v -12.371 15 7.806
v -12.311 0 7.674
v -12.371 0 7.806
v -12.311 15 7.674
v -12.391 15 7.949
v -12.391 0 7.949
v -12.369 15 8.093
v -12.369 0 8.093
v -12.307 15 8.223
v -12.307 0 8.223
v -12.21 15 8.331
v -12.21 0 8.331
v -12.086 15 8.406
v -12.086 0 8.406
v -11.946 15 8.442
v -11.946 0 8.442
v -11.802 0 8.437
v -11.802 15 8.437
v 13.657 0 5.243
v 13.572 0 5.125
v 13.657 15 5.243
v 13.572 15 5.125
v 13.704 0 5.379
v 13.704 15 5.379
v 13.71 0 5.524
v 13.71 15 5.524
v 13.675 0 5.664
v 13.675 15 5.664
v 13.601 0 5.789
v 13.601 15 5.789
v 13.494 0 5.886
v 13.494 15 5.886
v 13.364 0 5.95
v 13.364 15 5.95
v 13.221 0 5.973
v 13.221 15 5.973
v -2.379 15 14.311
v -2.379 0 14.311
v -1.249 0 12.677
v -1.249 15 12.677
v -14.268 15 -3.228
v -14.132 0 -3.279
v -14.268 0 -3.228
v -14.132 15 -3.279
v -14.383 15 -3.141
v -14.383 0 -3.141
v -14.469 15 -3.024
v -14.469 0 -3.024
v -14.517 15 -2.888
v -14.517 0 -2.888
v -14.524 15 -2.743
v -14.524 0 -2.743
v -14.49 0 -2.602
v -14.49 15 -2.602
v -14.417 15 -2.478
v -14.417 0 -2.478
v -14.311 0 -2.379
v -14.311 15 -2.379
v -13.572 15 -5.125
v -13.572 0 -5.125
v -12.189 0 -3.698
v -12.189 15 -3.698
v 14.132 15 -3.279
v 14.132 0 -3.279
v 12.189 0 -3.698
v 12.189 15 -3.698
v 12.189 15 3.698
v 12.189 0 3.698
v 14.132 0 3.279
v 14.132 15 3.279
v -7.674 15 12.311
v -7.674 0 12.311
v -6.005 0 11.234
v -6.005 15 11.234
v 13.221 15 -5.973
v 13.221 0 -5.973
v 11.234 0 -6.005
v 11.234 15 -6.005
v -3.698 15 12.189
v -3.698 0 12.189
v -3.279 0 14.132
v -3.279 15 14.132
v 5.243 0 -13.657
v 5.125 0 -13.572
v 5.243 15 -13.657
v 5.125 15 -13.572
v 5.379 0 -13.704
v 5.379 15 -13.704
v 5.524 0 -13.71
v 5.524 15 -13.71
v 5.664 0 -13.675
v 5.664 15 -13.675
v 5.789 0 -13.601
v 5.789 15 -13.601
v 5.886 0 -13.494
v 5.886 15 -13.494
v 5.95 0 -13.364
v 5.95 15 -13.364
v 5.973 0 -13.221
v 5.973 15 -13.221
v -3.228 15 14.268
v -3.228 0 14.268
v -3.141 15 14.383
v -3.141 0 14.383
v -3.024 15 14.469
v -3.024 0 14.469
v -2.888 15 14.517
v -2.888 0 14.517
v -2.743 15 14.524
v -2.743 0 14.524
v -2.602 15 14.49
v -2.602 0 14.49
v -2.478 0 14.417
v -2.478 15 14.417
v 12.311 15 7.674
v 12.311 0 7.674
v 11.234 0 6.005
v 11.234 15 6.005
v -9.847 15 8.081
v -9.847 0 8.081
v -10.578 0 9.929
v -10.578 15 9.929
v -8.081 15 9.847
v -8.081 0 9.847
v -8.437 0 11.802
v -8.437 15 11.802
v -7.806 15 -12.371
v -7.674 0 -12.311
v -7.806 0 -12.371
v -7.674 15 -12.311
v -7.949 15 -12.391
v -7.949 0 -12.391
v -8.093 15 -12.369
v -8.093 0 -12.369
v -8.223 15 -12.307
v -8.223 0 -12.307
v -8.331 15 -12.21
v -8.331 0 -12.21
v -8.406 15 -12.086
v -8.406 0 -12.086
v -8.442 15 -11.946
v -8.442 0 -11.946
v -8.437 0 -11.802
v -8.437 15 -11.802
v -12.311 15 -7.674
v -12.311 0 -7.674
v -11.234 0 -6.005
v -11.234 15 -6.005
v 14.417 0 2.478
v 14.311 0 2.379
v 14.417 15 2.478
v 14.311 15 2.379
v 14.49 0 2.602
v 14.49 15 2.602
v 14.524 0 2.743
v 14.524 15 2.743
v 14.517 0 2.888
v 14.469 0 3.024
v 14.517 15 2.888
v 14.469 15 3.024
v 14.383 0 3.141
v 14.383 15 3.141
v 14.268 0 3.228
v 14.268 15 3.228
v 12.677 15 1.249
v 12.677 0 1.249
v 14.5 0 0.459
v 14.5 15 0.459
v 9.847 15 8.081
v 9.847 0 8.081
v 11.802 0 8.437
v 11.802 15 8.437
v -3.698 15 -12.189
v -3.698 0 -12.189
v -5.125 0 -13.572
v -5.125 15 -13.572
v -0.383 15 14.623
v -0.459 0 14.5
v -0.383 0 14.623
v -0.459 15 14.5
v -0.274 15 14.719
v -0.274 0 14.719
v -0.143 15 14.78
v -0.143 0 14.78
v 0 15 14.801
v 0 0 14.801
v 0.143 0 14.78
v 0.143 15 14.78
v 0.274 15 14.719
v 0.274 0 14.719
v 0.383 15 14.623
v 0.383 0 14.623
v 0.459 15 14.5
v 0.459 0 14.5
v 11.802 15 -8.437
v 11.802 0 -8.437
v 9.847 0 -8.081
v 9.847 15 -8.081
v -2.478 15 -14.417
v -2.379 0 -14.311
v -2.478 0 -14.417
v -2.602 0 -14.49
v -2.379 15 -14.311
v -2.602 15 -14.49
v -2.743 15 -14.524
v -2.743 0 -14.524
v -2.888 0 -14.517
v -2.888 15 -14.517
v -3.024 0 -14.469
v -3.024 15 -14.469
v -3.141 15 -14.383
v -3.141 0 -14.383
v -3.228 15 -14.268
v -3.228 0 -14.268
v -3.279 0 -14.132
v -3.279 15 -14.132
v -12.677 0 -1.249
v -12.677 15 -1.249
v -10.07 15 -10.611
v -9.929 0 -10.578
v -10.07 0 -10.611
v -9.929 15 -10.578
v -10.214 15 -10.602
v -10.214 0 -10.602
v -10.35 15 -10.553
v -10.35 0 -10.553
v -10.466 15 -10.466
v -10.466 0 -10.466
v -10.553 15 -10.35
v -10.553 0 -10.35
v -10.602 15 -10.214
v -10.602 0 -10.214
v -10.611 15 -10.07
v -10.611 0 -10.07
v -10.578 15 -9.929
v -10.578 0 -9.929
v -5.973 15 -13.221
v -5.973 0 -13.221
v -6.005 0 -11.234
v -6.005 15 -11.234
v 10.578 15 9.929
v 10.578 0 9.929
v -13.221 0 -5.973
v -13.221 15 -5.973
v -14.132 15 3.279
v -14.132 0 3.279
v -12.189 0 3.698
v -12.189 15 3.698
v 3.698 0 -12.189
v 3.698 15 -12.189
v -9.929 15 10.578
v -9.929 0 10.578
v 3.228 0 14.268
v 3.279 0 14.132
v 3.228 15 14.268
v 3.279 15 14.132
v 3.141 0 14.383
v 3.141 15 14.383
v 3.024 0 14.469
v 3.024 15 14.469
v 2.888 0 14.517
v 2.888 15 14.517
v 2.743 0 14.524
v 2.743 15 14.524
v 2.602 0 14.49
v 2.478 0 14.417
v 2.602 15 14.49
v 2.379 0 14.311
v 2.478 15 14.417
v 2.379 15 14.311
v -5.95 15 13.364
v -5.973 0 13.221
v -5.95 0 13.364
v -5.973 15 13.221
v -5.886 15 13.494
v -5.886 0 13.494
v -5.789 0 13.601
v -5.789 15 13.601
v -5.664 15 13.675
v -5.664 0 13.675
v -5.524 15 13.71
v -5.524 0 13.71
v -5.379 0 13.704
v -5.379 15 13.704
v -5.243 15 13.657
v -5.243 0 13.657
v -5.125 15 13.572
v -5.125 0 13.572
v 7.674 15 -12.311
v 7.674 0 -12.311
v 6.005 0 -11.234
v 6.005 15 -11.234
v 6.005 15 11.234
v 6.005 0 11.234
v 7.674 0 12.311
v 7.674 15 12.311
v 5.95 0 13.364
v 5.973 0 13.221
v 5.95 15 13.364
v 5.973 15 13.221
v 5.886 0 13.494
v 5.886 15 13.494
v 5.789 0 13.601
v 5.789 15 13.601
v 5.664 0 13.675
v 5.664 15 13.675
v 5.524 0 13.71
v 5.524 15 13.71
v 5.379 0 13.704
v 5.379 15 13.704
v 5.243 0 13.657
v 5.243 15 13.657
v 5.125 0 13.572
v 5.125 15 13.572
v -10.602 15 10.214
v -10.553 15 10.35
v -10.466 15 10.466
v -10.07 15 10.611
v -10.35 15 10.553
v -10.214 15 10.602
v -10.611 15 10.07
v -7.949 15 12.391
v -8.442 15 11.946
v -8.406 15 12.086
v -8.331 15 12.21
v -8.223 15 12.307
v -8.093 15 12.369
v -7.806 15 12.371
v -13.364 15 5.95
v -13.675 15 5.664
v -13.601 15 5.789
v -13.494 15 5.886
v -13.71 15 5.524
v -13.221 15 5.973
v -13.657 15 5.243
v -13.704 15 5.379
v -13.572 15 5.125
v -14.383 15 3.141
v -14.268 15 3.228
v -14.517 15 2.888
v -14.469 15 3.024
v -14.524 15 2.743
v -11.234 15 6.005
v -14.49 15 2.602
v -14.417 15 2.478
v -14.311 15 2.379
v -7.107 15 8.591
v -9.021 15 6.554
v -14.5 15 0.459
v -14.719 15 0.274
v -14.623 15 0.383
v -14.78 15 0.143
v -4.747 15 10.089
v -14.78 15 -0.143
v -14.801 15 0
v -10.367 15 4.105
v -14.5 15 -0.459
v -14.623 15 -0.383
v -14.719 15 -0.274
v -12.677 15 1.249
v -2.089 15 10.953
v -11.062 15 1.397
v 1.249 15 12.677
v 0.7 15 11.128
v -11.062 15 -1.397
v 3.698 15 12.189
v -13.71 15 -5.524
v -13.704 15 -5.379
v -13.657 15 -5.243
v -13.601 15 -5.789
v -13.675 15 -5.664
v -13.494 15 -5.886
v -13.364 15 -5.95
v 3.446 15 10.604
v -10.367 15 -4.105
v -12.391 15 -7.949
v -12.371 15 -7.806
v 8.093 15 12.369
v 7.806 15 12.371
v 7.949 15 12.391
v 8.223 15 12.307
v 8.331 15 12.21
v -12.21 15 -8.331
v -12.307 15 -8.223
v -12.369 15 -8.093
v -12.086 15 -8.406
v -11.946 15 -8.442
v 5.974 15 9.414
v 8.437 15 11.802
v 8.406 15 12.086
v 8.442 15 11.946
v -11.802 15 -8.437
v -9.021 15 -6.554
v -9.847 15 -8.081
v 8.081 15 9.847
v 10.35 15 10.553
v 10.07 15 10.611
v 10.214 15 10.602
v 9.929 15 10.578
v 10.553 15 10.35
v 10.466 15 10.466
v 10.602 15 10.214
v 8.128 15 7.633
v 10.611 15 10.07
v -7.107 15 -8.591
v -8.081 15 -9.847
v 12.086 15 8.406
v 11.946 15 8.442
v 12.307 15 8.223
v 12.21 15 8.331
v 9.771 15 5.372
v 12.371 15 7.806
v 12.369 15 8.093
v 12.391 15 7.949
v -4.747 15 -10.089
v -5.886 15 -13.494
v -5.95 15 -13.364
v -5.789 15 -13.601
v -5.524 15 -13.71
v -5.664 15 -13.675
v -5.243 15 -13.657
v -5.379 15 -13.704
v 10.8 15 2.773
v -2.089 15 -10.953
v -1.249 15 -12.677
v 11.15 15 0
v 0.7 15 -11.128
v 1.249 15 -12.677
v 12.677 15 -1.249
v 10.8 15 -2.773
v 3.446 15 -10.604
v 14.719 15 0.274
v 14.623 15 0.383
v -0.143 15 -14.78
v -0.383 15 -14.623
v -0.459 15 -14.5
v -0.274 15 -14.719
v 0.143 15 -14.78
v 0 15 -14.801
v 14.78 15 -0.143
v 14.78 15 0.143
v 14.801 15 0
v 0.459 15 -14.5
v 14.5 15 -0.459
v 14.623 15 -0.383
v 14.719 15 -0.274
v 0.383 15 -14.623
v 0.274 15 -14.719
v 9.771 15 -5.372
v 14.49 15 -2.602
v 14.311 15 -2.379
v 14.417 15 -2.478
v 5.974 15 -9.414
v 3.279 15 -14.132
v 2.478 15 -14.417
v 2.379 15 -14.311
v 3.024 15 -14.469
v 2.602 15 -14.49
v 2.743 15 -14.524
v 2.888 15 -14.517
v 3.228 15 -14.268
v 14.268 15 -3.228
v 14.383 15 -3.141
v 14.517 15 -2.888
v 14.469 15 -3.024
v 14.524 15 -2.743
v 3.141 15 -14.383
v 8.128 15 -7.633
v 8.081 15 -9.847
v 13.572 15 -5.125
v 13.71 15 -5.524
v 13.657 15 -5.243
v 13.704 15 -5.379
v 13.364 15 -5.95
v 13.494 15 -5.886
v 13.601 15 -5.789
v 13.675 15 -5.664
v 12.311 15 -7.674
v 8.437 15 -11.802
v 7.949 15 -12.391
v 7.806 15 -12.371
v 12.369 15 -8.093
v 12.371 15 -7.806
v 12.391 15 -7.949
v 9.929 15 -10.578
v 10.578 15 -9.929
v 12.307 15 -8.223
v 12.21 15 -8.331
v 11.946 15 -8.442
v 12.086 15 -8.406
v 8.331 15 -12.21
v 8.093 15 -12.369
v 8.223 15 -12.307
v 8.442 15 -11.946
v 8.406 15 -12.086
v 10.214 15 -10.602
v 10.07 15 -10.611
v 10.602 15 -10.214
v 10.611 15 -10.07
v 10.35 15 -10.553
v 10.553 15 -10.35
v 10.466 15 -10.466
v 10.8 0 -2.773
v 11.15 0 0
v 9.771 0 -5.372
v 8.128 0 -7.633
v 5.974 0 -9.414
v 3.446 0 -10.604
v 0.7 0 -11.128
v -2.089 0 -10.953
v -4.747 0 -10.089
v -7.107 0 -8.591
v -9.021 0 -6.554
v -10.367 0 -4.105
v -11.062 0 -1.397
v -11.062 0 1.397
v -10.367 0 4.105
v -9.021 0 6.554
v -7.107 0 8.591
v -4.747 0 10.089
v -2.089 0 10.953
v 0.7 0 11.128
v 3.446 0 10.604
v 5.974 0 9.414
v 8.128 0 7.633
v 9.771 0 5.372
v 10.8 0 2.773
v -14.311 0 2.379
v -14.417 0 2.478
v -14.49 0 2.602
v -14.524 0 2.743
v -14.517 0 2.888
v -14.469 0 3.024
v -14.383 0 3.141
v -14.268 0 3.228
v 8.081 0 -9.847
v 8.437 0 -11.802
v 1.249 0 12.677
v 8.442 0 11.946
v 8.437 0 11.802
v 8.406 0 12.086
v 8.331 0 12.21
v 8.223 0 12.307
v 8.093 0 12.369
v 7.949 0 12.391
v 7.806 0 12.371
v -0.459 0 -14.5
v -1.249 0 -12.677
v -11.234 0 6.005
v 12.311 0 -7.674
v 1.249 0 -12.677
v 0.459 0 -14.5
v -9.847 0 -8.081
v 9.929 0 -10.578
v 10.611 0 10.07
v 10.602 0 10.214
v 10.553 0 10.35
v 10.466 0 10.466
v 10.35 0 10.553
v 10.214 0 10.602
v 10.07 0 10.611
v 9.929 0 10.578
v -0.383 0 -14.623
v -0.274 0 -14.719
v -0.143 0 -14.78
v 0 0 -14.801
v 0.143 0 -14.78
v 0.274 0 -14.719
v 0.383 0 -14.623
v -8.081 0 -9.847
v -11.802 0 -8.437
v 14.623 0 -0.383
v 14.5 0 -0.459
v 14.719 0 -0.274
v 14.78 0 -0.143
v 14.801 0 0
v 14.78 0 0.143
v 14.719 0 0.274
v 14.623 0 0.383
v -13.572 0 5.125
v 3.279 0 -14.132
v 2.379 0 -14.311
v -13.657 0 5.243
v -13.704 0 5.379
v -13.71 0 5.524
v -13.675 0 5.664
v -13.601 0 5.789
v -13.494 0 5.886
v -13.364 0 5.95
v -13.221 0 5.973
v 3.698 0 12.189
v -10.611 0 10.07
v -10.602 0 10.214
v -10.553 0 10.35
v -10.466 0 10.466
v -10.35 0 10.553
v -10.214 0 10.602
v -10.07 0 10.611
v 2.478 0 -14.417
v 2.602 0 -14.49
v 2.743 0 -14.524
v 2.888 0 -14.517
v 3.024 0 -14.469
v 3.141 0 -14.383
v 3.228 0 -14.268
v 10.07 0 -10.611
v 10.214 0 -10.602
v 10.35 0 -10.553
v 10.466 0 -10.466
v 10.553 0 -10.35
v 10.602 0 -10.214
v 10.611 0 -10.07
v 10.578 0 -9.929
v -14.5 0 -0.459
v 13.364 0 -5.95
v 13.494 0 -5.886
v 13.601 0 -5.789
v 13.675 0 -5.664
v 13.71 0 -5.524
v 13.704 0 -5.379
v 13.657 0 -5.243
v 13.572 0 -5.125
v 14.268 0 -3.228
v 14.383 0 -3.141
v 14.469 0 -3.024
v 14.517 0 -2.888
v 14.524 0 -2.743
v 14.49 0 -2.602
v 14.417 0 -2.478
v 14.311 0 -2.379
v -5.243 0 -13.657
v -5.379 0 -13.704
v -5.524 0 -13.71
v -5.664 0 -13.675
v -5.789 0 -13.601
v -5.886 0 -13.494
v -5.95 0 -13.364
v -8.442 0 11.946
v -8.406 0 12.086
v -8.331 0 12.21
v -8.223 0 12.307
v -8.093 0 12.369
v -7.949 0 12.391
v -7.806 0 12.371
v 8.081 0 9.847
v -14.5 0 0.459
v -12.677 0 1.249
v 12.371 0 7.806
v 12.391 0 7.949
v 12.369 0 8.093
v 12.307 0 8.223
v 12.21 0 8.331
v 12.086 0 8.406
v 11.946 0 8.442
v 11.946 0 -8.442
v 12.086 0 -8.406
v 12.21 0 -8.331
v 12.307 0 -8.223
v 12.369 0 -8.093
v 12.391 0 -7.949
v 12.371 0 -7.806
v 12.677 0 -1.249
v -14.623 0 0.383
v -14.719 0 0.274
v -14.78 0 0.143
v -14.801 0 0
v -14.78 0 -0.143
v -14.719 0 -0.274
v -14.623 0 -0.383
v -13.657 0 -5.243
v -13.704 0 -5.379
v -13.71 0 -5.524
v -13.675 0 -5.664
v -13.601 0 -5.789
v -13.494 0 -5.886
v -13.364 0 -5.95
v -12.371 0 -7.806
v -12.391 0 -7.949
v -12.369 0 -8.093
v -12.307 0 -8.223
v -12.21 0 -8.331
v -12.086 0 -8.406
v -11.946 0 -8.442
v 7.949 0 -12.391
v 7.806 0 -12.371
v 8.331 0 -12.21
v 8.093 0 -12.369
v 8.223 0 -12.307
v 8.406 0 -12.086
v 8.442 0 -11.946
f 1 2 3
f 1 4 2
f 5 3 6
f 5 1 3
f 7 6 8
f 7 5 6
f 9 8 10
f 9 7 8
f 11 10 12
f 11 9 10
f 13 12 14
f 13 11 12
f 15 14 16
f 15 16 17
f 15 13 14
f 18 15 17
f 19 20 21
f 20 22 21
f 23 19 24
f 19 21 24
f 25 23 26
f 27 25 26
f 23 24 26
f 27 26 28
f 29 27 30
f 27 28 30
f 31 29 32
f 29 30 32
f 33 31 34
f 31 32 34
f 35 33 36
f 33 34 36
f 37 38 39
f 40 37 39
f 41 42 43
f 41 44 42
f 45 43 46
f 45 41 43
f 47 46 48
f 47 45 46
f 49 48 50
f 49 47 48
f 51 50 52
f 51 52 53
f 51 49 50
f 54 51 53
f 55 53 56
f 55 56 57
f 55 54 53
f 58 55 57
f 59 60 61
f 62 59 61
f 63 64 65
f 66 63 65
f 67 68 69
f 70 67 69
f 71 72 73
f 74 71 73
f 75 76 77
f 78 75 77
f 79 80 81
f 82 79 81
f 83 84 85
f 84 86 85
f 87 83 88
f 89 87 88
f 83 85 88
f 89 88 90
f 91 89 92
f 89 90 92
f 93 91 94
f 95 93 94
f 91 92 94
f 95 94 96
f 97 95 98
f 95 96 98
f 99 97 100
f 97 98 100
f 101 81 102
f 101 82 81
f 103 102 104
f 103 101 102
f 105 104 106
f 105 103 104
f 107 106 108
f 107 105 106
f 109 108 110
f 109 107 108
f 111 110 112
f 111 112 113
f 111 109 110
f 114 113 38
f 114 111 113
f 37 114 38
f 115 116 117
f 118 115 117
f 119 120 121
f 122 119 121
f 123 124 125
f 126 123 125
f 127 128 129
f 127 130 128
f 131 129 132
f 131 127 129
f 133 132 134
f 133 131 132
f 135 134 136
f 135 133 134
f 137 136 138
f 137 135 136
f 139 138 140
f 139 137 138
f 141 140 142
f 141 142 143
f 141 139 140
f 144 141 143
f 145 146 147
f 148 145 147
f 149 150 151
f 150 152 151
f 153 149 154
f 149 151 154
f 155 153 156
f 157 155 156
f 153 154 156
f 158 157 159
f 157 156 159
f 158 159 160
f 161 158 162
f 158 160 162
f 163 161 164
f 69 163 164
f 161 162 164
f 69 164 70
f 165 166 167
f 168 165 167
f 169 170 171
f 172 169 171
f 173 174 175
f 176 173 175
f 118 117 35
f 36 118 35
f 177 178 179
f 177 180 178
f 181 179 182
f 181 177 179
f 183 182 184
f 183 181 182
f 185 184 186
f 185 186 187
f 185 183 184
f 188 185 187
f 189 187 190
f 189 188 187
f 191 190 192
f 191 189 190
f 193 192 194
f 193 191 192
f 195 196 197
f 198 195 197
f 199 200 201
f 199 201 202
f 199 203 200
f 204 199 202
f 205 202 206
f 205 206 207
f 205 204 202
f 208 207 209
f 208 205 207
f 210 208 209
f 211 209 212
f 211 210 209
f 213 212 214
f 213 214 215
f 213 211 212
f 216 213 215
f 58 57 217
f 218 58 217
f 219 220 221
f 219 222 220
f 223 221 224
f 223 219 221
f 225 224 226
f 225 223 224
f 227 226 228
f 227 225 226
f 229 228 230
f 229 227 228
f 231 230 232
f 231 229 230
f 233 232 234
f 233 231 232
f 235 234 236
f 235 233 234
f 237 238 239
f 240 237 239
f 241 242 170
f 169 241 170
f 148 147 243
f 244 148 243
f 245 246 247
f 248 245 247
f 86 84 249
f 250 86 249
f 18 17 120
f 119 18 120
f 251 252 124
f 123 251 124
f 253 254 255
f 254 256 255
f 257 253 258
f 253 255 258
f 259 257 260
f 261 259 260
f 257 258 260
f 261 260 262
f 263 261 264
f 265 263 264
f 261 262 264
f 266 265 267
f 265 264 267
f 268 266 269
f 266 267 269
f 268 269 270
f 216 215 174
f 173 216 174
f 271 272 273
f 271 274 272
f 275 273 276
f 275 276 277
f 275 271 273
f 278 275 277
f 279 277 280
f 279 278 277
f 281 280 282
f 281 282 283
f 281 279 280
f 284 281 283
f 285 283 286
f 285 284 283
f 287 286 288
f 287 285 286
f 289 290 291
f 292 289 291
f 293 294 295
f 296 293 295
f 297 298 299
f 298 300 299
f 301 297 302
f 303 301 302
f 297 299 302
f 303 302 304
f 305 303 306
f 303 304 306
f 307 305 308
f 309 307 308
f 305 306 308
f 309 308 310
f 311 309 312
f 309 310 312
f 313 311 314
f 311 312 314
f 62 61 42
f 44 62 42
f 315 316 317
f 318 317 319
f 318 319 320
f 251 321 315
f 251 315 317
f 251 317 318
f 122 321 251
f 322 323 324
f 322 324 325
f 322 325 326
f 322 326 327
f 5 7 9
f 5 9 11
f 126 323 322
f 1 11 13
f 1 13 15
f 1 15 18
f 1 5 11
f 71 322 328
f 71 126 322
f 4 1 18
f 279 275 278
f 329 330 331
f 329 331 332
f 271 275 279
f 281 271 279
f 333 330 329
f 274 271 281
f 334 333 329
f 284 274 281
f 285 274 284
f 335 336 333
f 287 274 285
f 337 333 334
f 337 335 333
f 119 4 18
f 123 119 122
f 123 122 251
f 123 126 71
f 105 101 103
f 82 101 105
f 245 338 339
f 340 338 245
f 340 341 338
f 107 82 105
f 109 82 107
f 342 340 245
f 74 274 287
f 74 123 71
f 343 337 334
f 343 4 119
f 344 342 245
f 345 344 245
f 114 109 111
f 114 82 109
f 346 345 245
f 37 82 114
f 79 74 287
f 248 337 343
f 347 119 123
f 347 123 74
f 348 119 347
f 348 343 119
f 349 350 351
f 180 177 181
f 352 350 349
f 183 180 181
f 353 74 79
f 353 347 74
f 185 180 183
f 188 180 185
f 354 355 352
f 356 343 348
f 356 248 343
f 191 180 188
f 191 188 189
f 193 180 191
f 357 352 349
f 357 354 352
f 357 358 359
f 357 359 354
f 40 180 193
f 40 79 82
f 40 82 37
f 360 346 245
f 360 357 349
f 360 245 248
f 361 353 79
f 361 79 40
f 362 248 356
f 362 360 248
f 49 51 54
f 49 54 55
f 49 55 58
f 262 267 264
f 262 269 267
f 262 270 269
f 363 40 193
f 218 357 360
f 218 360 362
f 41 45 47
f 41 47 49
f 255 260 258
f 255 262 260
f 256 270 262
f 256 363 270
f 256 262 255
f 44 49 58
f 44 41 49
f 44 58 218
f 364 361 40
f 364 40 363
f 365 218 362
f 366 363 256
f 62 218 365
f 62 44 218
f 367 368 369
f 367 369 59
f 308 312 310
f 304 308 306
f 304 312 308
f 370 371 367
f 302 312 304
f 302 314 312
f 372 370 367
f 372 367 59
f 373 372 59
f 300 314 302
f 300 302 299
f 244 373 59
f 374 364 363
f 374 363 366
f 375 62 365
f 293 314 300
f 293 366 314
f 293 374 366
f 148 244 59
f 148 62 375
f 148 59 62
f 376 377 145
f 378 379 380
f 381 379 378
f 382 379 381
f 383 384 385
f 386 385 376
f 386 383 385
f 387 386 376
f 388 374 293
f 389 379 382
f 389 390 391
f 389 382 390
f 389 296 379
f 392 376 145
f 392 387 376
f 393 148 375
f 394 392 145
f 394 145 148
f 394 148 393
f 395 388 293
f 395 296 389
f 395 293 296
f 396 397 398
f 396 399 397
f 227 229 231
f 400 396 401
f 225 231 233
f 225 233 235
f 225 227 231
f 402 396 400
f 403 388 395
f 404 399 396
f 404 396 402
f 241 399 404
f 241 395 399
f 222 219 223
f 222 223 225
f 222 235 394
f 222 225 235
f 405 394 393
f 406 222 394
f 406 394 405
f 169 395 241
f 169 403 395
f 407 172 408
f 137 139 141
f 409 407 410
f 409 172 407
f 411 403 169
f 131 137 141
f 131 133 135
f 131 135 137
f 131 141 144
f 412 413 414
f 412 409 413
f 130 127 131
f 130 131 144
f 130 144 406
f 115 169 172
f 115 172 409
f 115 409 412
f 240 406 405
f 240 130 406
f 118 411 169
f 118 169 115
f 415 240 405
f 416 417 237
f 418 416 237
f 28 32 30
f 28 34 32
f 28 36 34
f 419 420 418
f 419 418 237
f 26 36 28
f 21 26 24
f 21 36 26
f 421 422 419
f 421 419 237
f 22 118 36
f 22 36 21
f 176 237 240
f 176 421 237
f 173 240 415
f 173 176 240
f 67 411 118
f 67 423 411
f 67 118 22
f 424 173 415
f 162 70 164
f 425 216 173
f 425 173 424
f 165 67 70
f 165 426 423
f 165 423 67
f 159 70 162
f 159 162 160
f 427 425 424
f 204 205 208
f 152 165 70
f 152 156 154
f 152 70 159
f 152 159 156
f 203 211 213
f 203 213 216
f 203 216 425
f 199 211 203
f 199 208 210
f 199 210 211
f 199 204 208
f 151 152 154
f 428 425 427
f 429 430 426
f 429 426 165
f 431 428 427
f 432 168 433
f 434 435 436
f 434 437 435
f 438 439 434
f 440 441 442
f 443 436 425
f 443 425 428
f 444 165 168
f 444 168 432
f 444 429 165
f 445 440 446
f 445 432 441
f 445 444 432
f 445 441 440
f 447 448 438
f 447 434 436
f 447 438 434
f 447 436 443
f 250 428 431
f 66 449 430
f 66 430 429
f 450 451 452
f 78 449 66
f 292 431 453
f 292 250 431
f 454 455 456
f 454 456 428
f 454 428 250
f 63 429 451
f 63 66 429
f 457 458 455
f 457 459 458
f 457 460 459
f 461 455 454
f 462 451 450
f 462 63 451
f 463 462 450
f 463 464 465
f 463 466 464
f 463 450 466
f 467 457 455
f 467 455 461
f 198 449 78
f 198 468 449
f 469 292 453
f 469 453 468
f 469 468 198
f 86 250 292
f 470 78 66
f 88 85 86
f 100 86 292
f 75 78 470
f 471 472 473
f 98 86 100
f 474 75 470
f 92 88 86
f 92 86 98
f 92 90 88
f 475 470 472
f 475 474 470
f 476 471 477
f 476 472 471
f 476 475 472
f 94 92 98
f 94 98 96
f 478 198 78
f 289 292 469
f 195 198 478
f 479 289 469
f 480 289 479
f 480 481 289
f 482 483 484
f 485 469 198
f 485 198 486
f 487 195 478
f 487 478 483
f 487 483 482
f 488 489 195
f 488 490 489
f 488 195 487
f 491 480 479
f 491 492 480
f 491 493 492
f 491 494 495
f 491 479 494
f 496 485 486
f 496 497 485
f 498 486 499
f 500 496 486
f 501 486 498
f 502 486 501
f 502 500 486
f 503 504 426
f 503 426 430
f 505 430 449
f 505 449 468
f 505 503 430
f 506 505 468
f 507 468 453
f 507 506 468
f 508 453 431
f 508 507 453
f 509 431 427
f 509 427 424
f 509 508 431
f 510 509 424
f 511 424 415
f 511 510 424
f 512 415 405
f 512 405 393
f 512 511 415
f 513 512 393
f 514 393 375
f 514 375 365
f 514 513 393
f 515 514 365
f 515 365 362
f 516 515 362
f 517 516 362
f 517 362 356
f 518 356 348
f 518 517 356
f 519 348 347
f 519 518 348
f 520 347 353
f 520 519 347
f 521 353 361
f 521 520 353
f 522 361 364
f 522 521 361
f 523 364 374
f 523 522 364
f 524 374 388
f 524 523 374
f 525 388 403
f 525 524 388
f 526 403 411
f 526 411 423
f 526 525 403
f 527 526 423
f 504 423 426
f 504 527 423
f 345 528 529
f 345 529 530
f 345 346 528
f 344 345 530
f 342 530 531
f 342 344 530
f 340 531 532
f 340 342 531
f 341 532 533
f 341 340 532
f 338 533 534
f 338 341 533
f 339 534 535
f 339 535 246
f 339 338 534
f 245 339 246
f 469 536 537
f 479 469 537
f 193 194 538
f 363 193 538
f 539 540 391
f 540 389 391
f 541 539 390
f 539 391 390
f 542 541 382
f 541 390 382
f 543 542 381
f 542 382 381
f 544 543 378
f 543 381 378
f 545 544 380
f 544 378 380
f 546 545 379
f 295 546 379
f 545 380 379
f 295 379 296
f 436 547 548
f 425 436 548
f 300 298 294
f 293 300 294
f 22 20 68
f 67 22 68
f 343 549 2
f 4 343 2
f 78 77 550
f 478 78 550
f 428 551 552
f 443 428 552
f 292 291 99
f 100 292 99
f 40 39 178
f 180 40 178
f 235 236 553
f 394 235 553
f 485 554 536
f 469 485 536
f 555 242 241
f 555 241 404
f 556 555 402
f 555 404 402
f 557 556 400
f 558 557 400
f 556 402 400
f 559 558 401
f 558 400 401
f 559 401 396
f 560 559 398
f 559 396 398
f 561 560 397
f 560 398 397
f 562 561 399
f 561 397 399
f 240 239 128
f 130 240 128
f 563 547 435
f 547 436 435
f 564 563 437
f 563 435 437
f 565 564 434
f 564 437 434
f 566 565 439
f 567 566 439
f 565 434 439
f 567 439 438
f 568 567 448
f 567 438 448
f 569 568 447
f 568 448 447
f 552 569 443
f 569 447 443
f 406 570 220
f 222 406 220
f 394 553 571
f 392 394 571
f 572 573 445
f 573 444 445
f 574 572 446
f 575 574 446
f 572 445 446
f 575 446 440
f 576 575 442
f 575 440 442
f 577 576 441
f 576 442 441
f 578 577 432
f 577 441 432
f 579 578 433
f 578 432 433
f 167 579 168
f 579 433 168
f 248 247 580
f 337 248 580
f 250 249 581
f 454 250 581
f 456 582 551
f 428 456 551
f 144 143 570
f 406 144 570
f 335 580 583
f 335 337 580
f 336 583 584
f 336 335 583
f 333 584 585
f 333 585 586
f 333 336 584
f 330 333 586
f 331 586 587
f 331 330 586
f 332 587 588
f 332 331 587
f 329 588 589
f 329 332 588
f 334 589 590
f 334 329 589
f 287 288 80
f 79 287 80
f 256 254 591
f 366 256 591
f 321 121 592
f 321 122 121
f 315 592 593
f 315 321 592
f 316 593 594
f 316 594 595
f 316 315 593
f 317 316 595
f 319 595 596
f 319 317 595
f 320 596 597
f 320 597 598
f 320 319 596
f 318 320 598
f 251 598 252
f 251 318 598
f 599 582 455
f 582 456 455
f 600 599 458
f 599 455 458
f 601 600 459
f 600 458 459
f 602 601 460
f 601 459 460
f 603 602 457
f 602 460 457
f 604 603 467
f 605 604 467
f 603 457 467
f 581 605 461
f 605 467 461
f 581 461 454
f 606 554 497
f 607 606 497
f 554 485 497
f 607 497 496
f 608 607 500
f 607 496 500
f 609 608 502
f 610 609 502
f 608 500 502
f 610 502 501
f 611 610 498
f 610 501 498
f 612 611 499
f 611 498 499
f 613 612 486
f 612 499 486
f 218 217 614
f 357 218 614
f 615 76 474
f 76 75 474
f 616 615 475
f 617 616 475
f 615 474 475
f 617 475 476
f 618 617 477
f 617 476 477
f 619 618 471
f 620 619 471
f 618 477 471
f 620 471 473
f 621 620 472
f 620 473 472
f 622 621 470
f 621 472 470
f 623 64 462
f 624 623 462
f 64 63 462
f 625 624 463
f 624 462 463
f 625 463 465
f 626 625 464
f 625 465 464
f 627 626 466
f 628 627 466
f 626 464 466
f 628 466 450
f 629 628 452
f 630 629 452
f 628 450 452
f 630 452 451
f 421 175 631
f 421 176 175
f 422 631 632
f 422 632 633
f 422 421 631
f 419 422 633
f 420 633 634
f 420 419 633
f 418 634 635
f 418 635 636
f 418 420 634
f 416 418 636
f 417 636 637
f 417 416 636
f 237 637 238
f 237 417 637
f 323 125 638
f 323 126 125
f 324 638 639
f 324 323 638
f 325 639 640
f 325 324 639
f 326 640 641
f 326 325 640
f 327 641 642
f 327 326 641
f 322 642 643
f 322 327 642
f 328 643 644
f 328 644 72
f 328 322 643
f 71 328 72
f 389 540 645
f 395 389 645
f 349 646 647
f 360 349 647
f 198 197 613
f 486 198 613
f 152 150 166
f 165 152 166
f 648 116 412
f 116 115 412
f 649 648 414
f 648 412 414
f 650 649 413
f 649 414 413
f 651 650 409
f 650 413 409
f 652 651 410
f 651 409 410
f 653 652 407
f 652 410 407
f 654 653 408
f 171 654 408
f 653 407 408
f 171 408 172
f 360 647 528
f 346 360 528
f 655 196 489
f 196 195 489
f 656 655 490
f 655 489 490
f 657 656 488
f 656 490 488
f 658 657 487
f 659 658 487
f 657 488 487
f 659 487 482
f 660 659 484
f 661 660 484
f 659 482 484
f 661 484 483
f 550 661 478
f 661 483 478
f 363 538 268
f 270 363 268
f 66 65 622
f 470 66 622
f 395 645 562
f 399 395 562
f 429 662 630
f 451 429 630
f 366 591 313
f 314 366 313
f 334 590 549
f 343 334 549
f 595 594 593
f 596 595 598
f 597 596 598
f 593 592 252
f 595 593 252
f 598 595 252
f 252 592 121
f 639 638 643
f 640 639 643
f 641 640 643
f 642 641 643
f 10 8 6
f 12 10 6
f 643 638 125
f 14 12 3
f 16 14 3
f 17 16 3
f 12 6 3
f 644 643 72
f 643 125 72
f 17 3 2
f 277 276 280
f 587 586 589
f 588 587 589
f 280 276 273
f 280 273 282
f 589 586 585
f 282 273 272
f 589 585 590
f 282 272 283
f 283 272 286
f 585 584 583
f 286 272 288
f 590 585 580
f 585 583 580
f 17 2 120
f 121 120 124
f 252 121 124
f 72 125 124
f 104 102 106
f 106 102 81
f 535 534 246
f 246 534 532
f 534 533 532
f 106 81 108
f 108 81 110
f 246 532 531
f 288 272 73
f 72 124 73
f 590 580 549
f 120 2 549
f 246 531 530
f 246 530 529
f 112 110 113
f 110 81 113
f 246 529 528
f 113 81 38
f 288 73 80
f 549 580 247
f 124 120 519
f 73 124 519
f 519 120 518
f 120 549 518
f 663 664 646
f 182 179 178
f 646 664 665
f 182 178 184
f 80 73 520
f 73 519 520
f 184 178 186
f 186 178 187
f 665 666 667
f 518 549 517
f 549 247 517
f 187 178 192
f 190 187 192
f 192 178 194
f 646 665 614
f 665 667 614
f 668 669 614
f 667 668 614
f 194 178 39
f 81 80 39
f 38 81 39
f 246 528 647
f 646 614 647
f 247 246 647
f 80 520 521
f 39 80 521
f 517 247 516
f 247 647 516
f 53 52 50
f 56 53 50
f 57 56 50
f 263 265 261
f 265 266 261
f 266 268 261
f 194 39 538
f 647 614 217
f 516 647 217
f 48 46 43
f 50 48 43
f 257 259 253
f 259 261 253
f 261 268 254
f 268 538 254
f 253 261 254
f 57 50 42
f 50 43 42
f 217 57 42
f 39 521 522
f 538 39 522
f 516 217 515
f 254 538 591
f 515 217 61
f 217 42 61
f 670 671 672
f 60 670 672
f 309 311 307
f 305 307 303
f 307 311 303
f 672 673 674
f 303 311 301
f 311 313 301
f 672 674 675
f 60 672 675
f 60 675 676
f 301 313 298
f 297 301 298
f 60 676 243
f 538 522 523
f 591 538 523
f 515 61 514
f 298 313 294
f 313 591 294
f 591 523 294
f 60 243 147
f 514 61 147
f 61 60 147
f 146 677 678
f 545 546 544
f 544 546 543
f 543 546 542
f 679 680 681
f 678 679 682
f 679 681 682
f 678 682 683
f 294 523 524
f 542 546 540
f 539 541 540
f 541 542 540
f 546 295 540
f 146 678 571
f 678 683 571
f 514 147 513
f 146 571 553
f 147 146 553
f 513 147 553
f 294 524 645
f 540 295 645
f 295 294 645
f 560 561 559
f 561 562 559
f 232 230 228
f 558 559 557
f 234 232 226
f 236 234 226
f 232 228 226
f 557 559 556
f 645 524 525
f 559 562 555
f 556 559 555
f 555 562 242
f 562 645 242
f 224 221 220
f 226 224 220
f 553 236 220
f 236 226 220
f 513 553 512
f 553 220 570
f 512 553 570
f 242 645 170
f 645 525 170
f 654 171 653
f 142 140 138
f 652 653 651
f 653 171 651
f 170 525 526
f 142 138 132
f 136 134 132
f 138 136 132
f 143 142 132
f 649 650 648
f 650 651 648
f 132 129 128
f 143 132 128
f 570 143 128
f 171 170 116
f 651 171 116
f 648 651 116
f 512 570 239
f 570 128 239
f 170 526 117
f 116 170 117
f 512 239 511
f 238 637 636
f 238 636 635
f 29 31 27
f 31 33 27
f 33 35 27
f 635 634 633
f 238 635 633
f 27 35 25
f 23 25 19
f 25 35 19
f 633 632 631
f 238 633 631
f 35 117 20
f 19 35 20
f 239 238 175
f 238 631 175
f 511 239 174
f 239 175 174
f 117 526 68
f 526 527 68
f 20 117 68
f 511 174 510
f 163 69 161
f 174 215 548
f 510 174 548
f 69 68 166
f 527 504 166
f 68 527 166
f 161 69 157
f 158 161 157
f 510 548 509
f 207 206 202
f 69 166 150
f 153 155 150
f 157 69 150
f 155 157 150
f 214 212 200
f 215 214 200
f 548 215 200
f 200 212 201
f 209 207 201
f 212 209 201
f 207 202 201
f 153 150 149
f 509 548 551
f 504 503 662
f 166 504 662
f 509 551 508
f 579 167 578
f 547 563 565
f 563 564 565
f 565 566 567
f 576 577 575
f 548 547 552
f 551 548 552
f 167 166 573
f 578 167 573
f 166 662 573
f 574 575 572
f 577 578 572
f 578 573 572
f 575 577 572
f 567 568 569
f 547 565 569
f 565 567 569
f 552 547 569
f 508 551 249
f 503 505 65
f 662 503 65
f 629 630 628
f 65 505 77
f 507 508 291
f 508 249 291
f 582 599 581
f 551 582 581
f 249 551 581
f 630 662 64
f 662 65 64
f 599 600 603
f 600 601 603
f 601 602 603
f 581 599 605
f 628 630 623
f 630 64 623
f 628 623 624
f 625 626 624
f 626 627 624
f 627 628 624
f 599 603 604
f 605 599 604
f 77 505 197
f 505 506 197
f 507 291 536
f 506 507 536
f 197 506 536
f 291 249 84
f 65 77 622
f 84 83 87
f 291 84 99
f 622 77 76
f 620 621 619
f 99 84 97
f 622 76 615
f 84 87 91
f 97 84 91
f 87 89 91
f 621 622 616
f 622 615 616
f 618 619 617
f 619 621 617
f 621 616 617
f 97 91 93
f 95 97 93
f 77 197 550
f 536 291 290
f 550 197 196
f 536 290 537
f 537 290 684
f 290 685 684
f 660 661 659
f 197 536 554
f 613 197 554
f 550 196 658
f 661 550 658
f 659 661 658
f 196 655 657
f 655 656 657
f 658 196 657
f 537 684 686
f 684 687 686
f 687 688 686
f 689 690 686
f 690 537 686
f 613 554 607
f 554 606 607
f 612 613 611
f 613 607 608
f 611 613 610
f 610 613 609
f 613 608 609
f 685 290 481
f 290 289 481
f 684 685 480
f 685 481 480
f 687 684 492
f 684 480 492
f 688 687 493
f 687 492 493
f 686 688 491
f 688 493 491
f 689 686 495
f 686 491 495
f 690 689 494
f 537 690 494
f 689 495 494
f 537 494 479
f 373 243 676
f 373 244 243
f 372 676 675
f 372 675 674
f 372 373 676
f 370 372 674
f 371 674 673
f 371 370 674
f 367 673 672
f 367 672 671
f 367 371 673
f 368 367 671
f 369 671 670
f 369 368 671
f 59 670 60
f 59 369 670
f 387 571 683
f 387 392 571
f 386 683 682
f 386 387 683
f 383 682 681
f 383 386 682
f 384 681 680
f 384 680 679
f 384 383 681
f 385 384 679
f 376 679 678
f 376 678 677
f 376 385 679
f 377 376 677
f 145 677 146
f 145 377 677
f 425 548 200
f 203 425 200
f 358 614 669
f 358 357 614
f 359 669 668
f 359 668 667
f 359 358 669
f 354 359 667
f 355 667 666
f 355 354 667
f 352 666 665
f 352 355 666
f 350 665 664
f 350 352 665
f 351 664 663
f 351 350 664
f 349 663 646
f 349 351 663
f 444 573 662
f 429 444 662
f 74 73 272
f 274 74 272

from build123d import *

# Parameters (mm, degrees)
SKETCH1_R           = 11.15
BOSS_EXTRUDE1_DEPTH = 15
FILLET1_R           = 0.5


with BuildPart() as part:
    # Sketch1 → Boss-Extrude1 (new body)
    with BuildSketch(Plane(origin=(0, 0, 0), x_dir=(1, 0, 0), z_dir=(0, 1, 0))):
        Polygon((0, 15.55956659), (-1.24854043, 12.676643718), (-3.035520856, 15.260593881), (-3.69764058, 12.189487409), (-5.954388349, 14.375165107), (-6.004642477, 11.233895935), (-8.644432036, 12.9373068), (-8.080889331, 9.84659214), (-11.002275048, 11.002275048), (-9.84659214, 8.080889331), (-12.9373068, 8.644432036), (-11.233895935, 6.004642477), (-14.375165107, 5.954388349), (-12.189487409, 3.69764058), (-15.260593881, 3.035520856), (-12.676643718, 1.24854043), (-15.55956659, 0), (-12.676643718, -1.24854043), (-15.260593881, -3.035520856), (-12.189487409, -3.69764058), (-14.375165107, -5.954388349), (-11.233895935, -6.004642477), (-12.9373068, -8.644432036), (-9.84659214, -8.080889331), (-11.002275048, -11.002275048), (-8.080889331, -9.84659214), (-8.644432036, -12.9373068), (-6.004642477, -11.233895935), (-5.954388349, -14.375165107), (-3.69764058, -12.189487409), (-3.035520856, -15.260593881), (-1.24854043, -12.676643718), (0, -15.55956659), (1.24854043, -12.676643718), (3.035520856, -15.260593881), (3.69764058, -12.189487409), (5.954388349, -14.375165107), (6.004642477, -11.233895935), (8.644432036, -12.9373068), (8.080889331, -9.84659214), (11.002275048, -11.002275048), (9.84659214, -8.080889331), (12.9373068, -8.644432036), (11.233895935, -6.004642477), (14.375165107, -5.954388349), (12.189487409, -3.69764058), (15.260593881, -3.035520856), (12.676643718, -1.24854043), (15.55956659, 0), (12.676643718, 1.24854043), (15.260593881, 3.035520856), (12.189487409, 3.69764058), (14.375165107, 5.954388349), (11.233895935, 6.004642477), (12.9373068, 8.644432036), (9.84659214, 8.080889331), (11.002275048, 11.002275048), (8.080889331, 9.84659214), (8.644432036, 12.9373068), (6.004642477, 11.233895935), (5.954388349, 14.375165107), (3.69764058, 12.189487409), (3.035520856, 15.260593881), (1.24854043, 12.676643718), align=None)
        Circle(SKETCH1_R, mode=Mode.SUBTRACT)
    extrude(amount=BOSS_EXTRUDE1_DEPTH)

    # Fillet1
    fillet1_edges = [part.edges().sort_by_distance(p)[0] for p in [
        (0, 7.5, -15.55956659),
        (3.035520856, 7.5, -15.260593881),
        (5.954388349, 7.5, -14.375165107),
        (8.644432036, 7.5, -12.9373068),
        (11.002275048, 7.5, -11.002275048),
        (12.9373068, 7.5, -8.644432036),
        (14.375165107, 7.5, -5.954388349),
        (15.260593881, 7.5, -3.035520856),
        (15.55956659, 7.5, 0),
        (15.260593881, 7.5, 3.035520856),
        (14.375165107, 7.5, 5.954388349),
        (12.9373068, 7.5, 8.644432036),
        (11.002275048, 7.5, 11.002275048),
        (8.644432036, 7.5, 12.9373068),
        (5.954388349, 7.5, 14.375165107),
        (3.035520856, 7.5, 15.260593881),
        (0, 7.5, 15.55956659),
        (-3.035520856, 7.5, 15.260593881),
        (-5.954388349, 7.5, 14.375165107),
        (-8.644432036, 7.5, 12.9373068),
        (-11.002275048, 7.5, 11.002275048),
        (-12.9373068, 7.5, 8.644432036),
        (-14.375165107, 7.5, 5.954388349),
        (-15.260593881, 7.5, 3.035520856),
        (-15.55956659, 7.5, 0),
        (-15.260593881, 7.5, -3.035520856),
        (-14.375165107, 7.5, -5.954388349),
        (-12.9373068, 7.5, -8.644432036),
        (-11.002275048, 7.5, -11.002275048),
        (-8.644432036, 7.5, -12.9373068),
        (-5.954388349, 7.5, -14.375165107),
        (-3.035520856, 7.5, -15.260593881),
    ]]
    fillet(fillet1_edges, radius=FILLET1_R)


solid = part.part
